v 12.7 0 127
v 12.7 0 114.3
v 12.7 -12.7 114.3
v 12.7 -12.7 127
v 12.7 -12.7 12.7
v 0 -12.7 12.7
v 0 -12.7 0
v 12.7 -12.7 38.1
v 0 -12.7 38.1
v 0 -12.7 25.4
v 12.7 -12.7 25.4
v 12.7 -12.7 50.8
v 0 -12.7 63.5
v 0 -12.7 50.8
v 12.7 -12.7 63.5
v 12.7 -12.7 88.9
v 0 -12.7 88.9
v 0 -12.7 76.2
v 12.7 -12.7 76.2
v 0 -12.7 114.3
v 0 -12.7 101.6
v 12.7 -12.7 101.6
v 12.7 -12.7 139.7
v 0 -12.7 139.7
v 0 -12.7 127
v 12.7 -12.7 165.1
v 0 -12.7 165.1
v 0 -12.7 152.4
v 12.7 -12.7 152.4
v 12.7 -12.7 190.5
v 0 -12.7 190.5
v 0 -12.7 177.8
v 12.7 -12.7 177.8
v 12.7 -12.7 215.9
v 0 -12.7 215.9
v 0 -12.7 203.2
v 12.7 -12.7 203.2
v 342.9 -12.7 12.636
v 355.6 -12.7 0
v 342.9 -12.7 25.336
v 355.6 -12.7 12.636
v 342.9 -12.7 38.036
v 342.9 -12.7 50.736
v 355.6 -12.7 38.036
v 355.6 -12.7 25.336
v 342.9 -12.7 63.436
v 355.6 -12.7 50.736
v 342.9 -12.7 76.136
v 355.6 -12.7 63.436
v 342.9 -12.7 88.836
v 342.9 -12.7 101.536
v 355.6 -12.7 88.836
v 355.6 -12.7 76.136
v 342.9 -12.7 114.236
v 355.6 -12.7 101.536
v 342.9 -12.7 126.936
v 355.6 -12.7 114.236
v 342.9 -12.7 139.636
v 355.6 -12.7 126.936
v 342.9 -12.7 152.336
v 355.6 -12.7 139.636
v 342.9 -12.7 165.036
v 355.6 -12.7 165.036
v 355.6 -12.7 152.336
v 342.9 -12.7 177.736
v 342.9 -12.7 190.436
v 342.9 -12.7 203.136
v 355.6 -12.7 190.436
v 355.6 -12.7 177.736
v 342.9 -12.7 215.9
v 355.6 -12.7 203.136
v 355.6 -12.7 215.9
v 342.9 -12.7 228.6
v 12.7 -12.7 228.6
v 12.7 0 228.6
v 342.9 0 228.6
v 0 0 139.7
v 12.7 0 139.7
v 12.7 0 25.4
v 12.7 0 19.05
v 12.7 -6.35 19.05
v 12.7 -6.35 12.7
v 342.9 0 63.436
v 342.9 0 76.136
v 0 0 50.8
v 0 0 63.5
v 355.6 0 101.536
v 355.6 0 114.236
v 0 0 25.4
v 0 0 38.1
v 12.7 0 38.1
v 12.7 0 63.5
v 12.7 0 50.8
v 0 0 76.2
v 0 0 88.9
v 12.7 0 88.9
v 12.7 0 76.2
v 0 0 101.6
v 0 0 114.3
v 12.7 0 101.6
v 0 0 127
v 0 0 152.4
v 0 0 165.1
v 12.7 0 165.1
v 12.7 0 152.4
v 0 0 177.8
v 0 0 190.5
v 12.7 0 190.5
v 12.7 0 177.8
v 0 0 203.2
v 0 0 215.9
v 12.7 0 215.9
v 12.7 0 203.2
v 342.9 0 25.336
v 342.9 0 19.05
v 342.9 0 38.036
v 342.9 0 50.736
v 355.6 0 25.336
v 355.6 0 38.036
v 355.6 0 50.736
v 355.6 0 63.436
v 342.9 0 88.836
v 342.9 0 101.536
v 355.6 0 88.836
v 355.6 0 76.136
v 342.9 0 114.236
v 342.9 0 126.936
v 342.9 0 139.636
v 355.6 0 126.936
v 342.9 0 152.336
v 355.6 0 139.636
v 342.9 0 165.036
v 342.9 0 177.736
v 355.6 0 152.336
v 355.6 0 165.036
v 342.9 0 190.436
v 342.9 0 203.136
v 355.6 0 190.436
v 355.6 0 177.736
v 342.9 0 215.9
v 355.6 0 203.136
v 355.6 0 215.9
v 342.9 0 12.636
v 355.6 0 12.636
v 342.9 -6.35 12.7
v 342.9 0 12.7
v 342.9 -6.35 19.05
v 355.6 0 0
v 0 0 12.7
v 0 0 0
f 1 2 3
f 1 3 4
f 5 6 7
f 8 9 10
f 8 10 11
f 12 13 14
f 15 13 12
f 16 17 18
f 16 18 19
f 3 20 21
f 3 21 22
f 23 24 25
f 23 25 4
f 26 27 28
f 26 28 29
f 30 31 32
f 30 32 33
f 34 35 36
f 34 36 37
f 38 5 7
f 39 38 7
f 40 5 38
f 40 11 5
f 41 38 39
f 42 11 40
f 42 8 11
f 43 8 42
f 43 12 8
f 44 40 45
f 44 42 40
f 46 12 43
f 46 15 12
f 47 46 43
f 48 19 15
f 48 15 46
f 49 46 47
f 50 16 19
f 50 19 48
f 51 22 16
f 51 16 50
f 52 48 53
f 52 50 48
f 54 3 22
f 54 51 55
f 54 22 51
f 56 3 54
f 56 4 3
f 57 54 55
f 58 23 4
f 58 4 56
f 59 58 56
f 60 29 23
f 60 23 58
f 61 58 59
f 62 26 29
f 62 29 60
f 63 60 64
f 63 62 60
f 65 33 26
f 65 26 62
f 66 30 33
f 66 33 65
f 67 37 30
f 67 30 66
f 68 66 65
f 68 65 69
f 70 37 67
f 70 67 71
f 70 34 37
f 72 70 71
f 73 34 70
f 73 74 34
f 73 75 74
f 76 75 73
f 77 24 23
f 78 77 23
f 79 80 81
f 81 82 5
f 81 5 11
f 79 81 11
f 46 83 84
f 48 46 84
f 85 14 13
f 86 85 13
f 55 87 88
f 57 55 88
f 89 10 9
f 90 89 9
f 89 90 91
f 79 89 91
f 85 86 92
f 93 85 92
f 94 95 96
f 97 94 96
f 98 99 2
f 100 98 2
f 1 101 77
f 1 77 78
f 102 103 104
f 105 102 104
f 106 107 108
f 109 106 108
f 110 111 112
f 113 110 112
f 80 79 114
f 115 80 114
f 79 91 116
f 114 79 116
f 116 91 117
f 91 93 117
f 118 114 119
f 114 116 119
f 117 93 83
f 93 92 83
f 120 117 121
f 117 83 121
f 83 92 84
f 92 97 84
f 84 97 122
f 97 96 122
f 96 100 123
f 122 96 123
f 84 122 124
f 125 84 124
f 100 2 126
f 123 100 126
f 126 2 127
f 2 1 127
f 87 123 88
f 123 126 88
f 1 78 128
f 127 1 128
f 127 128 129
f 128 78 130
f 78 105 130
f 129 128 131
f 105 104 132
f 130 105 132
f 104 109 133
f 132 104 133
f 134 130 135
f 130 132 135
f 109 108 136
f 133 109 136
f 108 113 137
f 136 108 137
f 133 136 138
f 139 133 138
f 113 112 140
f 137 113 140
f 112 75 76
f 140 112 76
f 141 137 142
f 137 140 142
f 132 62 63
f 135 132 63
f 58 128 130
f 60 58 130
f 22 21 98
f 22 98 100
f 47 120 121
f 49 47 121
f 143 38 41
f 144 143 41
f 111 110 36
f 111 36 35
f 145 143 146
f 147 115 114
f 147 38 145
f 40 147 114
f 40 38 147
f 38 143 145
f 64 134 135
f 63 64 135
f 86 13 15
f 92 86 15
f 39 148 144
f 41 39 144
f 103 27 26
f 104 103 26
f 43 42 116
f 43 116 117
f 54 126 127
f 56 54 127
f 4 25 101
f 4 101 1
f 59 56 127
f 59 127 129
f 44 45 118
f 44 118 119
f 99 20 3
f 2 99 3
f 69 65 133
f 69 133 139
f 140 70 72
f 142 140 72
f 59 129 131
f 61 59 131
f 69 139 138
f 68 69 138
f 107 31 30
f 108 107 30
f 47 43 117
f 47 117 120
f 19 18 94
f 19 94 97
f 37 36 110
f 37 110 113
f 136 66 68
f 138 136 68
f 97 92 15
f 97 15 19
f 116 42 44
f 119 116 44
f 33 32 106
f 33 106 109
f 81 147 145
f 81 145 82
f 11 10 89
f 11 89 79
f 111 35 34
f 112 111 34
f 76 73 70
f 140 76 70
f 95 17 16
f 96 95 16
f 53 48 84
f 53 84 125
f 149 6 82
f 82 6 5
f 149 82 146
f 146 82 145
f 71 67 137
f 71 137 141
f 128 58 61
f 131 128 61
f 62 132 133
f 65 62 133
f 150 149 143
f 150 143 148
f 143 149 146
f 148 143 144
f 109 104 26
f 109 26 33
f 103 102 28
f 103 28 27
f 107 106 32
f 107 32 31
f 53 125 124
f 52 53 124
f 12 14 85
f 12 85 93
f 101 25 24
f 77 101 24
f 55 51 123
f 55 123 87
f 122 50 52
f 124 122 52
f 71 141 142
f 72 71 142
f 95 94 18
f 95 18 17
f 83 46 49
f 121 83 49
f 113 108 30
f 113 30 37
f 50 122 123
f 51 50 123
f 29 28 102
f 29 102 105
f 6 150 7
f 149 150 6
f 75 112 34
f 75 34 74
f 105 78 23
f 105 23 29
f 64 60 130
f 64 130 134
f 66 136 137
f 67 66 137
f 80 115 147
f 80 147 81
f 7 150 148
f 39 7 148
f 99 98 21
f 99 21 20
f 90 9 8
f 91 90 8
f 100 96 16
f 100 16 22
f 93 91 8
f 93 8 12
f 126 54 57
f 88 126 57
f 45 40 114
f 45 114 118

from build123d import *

# Parameters (mm, degrees)
F0_W     = 355.6
F0_H     = 228.6
F1_DEPTH = 12.7
F2_W     = 12.7
F2_H     = 12.7
F3_DEPTH = 25.4
F4_W     = 330.2
F4_H     = 6.35
F5_DEPTH = 6.35


with BuildPart() as f1:
    # F0 (on Front) → F1 (new body)
    with BuildSketch(Plane.XZ):
        with Locations((177.8, 114.3)):
            Rectangle(F0_W, F0_H)
    extrude(amount=F1_DEPTH)

    # F2 (on face) → F3 (cut)
    with BuildSketch(Plane.XZ.offset(12.7)):
        with Locations((6.35, 222.25)):
            Rectangle(F2_W, F2_H)
        with Locations((6.35, 196.85)):
            Rectangle(F2_W, F2_H)
        with Locations((6.35, 171.45)):
            Rectangle(F2_W, F2_H)
        with Locations((6.35, 146.05)):
            Rectangle(F2_W, F2_H)
        with Locations((6.35, 120.65)):
            Rectangle(F2_W, F2_H)
        with Locations((6.35, 95.25)):
            Rectangle(F2_W, F2_H)
        with Locations((6.35, 69.85)):
            Rectangle(F2_W, F2_H)
        with Locations((6.35, 44.45)):
            Rectangle(F2_W, F2_H)
        with Locations((6.35, 19.05)):
            Rectangle(F2_W, F2_H)
        Polygon((346.075, 228.6), (342.9, 228.6), (342.9, 215.9), (346.075, 215.9), (352.425, 215.9), (355.6, 215.9), (355.6, 228.6), (352.425, 228.6), align=None)
        with Locations((349.25, 196.786214)):
            Rectangle(F2_W, F2_H)
        with Locations((349.25, 171.386214)):
            Rectangle(F2_W, F2_H)
        with Locations((349.25, 145.986214)):
            Rectangle(F2_W, F2_H)
        with Locations((349.25, 120.586214)):
            Rectangle(F2_W, F2_H)
        with Locations((349.25, 95.186214)):
            Rectangle(F2_W, F2_H)
        with Locations((349.25, 69.786214)):
            Rectangle(F2_W, F2_H)
        with Locations((349.25, 44.386214)):
            Rectangle(F2_W, F2_H)
        with Locations((349.25, 18.986214)):
            Rectangle(F2_W, F2_H)
    extrude(amount=-F3_DEPTH, mode=Mode.SUBTRACT)

    # F4 (on face) → F5 (cut)
    with BuildSketch(Plane(origin=(0, 0, 0), x_dir=(-1, 0, 0), z_dir=(0, 1, 0))):
        with Locations((-177.8, 15.875)):
            Rectangle(F4_W, F4_H)
    extrude(amount=-F5_DEPTH, mode=Mode.SUBTRACT)


solid = f1.part
